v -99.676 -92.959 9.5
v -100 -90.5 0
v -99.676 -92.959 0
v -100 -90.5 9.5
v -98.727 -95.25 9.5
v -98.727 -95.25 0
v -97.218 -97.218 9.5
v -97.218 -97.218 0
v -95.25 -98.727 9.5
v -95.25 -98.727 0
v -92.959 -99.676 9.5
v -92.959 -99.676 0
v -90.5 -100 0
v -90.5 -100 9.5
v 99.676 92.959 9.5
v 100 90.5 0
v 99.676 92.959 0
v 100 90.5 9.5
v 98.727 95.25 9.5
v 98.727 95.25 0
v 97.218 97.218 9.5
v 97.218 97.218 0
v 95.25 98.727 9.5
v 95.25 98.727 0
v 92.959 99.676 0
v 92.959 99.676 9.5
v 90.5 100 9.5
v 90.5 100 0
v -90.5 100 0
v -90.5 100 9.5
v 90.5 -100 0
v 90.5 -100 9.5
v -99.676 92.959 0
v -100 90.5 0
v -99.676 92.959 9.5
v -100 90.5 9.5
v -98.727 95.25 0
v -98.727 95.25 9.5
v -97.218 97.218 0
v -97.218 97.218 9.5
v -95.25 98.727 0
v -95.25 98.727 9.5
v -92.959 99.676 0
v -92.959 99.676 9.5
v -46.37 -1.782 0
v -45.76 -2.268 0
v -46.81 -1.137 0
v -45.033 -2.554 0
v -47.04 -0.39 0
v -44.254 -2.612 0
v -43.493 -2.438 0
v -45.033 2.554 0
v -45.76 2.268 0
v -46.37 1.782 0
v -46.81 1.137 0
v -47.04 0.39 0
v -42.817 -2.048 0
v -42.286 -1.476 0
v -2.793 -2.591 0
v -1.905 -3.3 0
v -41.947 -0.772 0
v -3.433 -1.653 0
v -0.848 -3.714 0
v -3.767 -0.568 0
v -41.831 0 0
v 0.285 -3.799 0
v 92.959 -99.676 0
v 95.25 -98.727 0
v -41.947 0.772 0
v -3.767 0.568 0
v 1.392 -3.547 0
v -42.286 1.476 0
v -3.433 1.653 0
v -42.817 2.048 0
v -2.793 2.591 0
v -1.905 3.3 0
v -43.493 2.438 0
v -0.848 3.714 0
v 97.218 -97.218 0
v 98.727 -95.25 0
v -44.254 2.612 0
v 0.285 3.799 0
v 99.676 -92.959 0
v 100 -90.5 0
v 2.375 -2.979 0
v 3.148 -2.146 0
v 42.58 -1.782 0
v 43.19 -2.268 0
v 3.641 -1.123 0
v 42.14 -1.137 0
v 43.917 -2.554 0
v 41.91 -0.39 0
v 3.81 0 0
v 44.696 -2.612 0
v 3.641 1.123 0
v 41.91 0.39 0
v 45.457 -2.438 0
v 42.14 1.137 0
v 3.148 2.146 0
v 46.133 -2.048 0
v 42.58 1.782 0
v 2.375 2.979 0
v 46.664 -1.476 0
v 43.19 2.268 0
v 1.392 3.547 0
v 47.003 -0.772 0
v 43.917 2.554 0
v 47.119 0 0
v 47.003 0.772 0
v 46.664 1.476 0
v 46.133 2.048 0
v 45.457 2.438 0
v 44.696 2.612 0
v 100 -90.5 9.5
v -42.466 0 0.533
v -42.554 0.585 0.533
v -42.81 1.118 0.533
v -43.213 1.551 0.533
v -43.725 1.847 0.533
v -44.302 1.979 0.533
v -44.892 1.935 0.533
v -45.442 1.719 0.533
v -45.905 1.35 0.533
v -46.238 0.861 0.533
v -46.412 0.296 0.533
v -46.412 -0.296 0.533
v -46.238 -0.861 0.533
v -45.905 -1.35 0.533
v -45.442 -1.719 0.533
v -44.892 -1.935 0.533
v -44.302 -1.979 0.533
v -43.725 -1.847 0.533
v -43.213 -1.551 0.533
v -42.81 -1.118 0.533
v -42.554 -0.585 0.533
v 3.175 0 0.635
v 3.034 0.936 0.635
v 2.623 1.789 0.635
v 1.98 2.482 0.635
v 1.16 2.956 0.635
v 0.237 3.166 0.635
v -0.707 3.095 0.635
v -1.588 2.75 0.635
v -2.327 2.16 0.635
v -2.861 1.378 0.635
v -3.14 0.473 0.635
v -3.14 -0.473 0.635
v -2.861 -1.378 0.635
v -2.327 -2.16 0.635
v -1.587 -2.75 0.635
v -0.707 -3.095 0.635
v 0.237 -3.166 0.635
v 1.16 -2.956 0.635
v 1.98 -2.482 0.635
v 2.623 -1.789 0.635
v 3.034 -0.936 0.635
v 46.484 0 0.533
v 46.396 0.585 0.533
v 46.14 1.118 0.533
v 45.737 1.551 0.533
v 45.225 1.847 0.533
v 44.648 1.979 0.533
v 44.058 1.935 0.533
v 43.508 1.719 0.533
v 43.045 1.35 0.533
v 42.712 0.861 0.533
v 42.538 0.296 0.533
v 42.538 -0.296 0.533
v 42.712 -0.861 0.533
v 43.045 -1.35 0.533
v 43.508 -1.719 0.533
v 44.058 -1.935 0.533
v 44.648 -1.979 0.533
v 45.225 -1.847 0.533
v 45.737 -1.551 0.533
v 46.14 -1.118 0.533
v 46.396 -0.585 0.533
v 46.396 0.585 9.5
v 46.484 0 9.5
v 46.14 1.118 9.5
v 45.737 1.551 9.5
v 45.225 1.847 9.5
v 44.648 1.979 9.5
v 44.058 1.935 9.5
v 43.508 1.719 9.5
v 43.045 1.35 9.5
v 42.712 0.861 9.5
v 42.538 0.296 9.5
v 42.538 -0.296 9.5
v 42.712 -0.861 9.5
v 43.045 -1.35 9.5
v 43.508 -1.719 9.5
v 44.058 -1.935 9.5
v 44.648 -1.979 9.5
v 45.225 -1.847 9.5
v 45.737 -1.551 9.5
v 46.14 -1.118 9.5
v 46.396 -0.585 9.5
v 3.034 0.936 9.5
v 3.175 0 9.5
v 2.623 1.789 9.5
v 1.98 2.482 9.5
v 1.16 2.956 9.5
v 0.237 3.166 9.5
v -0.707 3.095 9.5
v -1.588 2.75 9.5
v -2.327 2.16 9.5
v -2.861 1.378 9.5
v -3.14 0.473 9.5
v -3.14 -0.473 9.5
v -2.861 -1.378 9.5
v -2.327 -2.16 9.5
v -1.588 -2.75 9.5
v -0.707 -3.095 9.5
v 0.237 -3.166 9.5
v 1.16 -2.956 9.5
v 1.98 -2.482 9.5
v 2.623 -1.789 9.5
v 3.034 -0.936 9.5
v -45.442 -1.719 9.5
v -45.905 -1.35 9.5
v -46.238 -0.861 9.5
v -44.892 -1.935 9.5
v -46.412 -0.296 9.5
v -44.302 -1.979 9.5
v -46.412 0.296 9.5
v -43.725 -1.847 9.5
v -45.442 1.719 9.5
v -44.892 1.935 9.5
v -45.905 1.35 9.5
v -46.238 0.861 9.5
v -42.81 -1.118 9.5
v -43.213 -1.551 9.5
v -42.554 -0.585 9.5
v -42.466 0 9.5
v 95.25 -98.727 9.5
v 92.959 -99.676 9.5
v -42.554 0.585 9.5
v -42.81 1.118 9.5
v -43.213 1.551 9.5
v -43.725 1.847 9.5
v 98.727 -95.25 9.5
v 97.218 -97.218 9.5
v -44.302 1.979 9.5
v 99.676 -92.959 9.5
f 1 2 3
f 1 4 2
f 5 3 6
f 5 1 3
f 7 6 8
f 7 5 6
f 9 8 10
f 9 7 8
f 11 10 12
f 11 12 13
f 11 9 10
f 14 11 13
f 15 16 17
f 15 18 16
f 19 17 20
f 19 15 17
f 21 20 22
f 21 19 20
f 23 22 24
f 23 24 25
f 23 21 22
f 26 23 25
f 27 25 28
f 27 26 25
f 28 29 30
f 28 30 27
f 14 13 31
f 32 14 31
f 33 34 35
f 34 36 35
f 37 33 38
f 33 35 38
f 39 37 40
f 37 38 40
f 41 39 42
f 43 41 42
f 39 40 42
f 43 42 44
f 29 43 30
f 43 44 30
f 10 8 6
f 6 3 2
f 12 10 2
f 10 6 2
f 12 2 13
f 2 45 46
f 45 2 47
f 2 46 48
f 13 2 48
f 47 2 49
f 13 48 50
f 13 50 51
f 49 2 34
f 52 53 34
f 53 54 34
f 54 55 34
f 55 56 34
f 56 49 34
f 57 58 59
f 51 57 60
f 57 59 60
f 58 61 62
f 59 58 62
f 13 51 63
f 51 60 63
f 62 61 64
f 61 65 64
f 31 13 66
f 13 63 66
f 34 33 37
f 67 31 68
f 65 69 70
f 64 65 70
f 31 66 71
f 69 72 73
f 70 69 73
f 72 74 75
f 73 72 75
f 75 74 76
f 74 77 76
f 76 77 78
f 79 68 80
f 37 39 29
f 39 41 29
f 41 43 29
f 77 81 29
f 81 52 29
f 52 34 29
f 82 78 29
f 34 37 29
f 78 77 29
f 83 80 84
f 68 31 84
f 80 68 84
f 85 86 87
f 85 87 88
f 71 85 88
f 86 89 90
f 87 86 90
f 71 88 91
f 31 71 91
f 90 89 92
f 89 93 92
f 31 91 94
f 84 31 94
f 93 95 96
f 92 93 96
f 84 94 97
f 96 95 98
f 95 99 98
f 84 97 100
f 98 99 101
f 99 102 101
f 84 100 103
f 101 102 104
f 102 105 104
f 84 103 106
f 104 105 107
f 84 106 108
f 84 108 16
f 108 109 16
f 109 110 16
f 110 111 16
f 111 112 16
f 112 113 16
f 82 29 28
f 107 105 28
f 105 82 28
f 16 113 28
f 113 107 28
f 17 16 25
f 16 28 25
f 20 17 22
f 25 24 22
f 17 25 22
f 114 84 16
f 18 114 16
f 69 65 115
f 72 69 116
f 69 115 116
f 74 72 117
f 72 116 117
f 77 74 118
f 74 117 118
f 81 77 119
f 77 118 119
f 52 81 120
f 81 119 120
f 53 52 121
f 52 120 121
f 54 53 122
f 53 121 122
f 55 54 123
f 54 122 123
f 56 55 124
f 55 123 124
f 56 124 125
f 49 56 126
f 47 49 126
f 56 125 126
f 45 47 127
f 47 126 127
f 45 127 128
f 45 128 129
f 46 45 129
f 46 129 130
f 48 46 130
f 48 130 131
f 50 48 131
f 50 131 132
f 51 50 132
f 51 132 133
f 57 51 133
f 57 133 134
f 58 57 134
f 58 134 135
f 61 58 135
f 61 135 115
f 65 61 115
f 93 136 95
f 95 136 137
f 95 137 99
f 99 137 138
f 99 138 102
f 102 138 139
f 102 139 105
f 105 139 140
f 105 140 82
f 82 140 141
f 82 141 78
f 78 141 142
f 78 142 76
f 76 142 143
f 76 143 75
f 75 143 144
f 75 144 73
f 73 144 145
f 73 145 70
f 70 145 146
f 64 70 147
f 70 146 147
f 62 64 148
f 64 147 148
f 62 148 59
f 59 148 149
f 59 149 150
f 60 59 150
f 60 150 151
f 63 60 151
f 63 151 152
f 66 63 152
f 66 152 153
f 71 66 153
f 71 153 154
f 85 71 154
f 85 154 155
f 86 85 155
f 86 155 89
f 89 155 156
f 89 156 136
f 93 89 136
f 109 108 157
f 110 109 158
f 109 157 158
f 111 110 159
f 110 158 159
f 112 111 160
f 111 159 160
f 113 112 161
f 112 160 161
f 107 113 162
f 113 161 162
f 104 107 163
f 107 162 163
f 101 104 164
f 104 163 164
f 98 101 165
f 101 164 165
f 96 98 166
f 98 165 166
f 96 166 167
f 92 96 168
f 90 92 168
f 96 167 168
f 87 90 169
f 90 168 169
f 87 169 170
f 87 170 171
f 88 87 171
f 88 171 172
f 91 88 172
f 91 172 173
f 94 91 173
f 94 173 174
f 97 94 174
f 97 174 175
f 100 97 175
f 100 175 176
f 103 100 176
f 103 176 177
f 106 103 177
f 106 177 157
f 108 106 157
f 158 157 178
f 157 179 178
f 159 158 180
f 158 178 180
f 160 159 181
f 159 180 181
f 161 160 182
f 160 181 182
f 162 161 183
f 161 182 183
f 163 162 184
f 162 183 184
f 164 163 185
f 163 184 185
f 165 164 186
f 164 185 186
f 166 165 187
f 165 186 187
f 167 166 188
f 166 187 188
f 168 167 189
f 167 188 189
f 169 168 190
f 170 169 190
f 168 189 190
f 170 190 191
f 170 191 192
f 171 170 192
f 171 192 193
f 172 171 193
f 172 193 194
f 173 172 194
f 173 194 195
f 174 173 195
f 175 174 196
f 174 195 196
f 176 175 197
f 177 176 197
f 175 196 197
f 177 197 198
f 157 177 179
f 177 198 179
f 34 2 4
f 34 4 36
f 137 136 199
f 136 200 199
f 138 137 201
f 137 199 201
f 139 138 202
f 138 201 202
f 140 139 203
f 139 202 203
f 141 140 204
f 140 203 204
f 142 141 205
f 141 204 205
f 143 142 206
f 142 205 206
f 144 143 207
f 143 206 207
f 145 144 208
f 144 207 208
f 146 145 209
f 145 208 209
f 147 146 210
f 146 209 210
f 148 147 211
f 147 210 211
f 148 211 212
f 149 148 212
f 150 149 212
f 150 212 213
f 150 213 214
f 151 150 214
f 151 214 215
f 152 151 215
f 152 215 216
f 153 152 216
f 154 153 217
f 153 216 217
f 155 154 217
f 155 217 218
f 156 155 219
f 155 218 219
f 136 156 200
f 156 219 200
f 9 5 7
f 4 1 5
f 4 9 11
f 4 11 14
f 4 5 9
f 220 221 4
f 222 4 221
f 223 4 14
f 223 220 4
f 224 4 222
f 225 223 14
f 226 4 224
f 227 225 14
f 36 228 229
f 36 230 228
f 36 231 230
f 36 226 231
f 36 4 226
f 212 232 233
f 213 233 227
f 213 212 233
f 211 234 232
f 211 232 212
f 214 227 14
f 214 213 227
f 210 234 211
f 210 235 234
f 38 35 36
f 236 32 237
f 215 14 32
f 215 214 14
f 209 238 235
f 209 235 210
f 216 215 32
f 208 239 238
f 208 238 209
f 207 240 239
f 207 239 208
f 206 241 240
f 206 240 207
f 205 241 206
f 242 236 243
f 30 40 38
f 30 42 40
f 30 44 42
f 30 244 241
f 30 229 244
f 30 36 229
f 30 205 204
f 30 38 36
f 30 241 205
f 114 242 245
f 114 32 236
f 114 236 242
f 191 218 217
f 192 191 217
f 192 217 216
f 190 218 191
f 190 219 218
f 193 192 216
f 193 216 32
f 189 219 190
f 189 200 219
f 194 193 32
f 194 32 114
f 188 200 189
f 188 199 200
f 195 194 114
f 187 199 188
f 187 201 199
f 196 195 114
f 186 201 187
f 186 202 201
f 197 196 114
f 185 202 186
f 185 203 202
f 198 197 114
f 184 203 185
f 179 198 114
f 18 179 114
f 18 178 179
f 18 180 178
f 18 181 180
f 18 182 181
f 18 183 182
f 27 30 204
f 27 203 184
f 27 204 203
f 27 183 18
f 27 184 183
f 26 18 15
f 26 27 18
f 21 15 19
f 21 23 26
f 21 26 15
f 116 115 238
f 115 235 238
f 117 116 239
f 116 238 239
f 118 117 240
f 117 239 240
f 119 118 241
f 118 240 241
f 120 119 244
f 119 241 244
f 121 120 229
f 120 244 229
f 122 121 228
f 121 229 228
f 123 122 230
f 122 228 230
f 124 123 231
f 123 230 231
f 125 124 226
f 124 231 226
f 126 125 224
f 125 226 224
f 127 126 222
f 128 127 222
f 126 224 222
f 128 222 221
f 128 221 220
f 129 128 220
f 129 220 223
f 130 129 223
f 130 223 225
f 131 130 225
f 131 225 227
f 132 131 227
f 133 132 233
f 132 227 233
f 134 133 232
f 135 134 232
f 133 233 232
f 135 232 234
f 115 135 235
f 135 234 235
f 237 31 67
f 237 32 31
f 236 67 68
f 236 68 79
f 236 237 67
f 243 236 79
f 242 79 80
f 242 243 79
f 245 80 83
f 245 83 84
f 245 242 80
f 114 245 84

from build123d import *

# Parameters (mm, degrees)
BASEPLATE_W                      = 200
BASEPLATE_H                      = 200
BOSS_EXTRUDE1_DEPTH              = 9.5
FILLET1_R                        = 9.5
F_1_4_INCH_BOLT_HOLE_D           = 6.35
F_1_4_INCH_BOLT_HOLE_CSINK_D     = 7.62
F_1_4_INCH_BOLT_HOLE_CSINK_ANGLE = 90
F_5_32_DOWEL_HOLE_D              = 3.96875
F_5_32_DOWEL_HOLE_CSINK_D        = 5.23875
F_5_32_DOWEL_HOLE_CSINK_ANGLE    = 100


with BuildPart() as part:
    # Baseplate → Boss-Extrude1 (new body)
    with BuildSketch(Plane.XY):
        Rectangle(BASEPLATE_W, BASEPLATE_H)
    extrude(amount=BOSS_EXTRUDE1_DEPTH)

    # Fillet1
    fillet1_edges = [part.edges().sort_by_distance(p)[0] for p in [
        (100, -100, 4.75),
        (-100, -100, 4.75),
        (-100, 100, 4.75),
        (100, 100, 4.75),
    ]]
    fillet(fillet1_edges, radius=FILLET1_R)

    # 1/4 Inch Bolt Hole (through all)
    with Locations(Plane(origin=(0, 0, 0), x_dir=(-1, 0, 0), z_dir=(0, 0, -1))):
        with Locations((0, 0)):
            CounterSinkHole(F_1_4_INCH_BOLT_HOLE_D / 2, F_1_4_INCH_BOLT_HOLE_CSINK_D / 2, counter_sink_angle=F_1_4_INCH_BOLT_HOLE_CSINK_ANGLE)

    # 5/32 Dowel Hole (through all)
    with Locations(Plane(origin=(0, 0, 0), x_dir=(-1, 0, 0), z_dir=(0, 0, -1))):
        with Locations((-44.5, 0), (44.45, 0)):
            CounterSinkHole(F_5_32_DOWEL_HOLE_D / 2, F_5_32_DOWEL_HOLE_CSINK_D / 2, counter_sink_angle=F_5_32_DOWEL_HOLE_CSINK_ANGLE)


solid = part.part
